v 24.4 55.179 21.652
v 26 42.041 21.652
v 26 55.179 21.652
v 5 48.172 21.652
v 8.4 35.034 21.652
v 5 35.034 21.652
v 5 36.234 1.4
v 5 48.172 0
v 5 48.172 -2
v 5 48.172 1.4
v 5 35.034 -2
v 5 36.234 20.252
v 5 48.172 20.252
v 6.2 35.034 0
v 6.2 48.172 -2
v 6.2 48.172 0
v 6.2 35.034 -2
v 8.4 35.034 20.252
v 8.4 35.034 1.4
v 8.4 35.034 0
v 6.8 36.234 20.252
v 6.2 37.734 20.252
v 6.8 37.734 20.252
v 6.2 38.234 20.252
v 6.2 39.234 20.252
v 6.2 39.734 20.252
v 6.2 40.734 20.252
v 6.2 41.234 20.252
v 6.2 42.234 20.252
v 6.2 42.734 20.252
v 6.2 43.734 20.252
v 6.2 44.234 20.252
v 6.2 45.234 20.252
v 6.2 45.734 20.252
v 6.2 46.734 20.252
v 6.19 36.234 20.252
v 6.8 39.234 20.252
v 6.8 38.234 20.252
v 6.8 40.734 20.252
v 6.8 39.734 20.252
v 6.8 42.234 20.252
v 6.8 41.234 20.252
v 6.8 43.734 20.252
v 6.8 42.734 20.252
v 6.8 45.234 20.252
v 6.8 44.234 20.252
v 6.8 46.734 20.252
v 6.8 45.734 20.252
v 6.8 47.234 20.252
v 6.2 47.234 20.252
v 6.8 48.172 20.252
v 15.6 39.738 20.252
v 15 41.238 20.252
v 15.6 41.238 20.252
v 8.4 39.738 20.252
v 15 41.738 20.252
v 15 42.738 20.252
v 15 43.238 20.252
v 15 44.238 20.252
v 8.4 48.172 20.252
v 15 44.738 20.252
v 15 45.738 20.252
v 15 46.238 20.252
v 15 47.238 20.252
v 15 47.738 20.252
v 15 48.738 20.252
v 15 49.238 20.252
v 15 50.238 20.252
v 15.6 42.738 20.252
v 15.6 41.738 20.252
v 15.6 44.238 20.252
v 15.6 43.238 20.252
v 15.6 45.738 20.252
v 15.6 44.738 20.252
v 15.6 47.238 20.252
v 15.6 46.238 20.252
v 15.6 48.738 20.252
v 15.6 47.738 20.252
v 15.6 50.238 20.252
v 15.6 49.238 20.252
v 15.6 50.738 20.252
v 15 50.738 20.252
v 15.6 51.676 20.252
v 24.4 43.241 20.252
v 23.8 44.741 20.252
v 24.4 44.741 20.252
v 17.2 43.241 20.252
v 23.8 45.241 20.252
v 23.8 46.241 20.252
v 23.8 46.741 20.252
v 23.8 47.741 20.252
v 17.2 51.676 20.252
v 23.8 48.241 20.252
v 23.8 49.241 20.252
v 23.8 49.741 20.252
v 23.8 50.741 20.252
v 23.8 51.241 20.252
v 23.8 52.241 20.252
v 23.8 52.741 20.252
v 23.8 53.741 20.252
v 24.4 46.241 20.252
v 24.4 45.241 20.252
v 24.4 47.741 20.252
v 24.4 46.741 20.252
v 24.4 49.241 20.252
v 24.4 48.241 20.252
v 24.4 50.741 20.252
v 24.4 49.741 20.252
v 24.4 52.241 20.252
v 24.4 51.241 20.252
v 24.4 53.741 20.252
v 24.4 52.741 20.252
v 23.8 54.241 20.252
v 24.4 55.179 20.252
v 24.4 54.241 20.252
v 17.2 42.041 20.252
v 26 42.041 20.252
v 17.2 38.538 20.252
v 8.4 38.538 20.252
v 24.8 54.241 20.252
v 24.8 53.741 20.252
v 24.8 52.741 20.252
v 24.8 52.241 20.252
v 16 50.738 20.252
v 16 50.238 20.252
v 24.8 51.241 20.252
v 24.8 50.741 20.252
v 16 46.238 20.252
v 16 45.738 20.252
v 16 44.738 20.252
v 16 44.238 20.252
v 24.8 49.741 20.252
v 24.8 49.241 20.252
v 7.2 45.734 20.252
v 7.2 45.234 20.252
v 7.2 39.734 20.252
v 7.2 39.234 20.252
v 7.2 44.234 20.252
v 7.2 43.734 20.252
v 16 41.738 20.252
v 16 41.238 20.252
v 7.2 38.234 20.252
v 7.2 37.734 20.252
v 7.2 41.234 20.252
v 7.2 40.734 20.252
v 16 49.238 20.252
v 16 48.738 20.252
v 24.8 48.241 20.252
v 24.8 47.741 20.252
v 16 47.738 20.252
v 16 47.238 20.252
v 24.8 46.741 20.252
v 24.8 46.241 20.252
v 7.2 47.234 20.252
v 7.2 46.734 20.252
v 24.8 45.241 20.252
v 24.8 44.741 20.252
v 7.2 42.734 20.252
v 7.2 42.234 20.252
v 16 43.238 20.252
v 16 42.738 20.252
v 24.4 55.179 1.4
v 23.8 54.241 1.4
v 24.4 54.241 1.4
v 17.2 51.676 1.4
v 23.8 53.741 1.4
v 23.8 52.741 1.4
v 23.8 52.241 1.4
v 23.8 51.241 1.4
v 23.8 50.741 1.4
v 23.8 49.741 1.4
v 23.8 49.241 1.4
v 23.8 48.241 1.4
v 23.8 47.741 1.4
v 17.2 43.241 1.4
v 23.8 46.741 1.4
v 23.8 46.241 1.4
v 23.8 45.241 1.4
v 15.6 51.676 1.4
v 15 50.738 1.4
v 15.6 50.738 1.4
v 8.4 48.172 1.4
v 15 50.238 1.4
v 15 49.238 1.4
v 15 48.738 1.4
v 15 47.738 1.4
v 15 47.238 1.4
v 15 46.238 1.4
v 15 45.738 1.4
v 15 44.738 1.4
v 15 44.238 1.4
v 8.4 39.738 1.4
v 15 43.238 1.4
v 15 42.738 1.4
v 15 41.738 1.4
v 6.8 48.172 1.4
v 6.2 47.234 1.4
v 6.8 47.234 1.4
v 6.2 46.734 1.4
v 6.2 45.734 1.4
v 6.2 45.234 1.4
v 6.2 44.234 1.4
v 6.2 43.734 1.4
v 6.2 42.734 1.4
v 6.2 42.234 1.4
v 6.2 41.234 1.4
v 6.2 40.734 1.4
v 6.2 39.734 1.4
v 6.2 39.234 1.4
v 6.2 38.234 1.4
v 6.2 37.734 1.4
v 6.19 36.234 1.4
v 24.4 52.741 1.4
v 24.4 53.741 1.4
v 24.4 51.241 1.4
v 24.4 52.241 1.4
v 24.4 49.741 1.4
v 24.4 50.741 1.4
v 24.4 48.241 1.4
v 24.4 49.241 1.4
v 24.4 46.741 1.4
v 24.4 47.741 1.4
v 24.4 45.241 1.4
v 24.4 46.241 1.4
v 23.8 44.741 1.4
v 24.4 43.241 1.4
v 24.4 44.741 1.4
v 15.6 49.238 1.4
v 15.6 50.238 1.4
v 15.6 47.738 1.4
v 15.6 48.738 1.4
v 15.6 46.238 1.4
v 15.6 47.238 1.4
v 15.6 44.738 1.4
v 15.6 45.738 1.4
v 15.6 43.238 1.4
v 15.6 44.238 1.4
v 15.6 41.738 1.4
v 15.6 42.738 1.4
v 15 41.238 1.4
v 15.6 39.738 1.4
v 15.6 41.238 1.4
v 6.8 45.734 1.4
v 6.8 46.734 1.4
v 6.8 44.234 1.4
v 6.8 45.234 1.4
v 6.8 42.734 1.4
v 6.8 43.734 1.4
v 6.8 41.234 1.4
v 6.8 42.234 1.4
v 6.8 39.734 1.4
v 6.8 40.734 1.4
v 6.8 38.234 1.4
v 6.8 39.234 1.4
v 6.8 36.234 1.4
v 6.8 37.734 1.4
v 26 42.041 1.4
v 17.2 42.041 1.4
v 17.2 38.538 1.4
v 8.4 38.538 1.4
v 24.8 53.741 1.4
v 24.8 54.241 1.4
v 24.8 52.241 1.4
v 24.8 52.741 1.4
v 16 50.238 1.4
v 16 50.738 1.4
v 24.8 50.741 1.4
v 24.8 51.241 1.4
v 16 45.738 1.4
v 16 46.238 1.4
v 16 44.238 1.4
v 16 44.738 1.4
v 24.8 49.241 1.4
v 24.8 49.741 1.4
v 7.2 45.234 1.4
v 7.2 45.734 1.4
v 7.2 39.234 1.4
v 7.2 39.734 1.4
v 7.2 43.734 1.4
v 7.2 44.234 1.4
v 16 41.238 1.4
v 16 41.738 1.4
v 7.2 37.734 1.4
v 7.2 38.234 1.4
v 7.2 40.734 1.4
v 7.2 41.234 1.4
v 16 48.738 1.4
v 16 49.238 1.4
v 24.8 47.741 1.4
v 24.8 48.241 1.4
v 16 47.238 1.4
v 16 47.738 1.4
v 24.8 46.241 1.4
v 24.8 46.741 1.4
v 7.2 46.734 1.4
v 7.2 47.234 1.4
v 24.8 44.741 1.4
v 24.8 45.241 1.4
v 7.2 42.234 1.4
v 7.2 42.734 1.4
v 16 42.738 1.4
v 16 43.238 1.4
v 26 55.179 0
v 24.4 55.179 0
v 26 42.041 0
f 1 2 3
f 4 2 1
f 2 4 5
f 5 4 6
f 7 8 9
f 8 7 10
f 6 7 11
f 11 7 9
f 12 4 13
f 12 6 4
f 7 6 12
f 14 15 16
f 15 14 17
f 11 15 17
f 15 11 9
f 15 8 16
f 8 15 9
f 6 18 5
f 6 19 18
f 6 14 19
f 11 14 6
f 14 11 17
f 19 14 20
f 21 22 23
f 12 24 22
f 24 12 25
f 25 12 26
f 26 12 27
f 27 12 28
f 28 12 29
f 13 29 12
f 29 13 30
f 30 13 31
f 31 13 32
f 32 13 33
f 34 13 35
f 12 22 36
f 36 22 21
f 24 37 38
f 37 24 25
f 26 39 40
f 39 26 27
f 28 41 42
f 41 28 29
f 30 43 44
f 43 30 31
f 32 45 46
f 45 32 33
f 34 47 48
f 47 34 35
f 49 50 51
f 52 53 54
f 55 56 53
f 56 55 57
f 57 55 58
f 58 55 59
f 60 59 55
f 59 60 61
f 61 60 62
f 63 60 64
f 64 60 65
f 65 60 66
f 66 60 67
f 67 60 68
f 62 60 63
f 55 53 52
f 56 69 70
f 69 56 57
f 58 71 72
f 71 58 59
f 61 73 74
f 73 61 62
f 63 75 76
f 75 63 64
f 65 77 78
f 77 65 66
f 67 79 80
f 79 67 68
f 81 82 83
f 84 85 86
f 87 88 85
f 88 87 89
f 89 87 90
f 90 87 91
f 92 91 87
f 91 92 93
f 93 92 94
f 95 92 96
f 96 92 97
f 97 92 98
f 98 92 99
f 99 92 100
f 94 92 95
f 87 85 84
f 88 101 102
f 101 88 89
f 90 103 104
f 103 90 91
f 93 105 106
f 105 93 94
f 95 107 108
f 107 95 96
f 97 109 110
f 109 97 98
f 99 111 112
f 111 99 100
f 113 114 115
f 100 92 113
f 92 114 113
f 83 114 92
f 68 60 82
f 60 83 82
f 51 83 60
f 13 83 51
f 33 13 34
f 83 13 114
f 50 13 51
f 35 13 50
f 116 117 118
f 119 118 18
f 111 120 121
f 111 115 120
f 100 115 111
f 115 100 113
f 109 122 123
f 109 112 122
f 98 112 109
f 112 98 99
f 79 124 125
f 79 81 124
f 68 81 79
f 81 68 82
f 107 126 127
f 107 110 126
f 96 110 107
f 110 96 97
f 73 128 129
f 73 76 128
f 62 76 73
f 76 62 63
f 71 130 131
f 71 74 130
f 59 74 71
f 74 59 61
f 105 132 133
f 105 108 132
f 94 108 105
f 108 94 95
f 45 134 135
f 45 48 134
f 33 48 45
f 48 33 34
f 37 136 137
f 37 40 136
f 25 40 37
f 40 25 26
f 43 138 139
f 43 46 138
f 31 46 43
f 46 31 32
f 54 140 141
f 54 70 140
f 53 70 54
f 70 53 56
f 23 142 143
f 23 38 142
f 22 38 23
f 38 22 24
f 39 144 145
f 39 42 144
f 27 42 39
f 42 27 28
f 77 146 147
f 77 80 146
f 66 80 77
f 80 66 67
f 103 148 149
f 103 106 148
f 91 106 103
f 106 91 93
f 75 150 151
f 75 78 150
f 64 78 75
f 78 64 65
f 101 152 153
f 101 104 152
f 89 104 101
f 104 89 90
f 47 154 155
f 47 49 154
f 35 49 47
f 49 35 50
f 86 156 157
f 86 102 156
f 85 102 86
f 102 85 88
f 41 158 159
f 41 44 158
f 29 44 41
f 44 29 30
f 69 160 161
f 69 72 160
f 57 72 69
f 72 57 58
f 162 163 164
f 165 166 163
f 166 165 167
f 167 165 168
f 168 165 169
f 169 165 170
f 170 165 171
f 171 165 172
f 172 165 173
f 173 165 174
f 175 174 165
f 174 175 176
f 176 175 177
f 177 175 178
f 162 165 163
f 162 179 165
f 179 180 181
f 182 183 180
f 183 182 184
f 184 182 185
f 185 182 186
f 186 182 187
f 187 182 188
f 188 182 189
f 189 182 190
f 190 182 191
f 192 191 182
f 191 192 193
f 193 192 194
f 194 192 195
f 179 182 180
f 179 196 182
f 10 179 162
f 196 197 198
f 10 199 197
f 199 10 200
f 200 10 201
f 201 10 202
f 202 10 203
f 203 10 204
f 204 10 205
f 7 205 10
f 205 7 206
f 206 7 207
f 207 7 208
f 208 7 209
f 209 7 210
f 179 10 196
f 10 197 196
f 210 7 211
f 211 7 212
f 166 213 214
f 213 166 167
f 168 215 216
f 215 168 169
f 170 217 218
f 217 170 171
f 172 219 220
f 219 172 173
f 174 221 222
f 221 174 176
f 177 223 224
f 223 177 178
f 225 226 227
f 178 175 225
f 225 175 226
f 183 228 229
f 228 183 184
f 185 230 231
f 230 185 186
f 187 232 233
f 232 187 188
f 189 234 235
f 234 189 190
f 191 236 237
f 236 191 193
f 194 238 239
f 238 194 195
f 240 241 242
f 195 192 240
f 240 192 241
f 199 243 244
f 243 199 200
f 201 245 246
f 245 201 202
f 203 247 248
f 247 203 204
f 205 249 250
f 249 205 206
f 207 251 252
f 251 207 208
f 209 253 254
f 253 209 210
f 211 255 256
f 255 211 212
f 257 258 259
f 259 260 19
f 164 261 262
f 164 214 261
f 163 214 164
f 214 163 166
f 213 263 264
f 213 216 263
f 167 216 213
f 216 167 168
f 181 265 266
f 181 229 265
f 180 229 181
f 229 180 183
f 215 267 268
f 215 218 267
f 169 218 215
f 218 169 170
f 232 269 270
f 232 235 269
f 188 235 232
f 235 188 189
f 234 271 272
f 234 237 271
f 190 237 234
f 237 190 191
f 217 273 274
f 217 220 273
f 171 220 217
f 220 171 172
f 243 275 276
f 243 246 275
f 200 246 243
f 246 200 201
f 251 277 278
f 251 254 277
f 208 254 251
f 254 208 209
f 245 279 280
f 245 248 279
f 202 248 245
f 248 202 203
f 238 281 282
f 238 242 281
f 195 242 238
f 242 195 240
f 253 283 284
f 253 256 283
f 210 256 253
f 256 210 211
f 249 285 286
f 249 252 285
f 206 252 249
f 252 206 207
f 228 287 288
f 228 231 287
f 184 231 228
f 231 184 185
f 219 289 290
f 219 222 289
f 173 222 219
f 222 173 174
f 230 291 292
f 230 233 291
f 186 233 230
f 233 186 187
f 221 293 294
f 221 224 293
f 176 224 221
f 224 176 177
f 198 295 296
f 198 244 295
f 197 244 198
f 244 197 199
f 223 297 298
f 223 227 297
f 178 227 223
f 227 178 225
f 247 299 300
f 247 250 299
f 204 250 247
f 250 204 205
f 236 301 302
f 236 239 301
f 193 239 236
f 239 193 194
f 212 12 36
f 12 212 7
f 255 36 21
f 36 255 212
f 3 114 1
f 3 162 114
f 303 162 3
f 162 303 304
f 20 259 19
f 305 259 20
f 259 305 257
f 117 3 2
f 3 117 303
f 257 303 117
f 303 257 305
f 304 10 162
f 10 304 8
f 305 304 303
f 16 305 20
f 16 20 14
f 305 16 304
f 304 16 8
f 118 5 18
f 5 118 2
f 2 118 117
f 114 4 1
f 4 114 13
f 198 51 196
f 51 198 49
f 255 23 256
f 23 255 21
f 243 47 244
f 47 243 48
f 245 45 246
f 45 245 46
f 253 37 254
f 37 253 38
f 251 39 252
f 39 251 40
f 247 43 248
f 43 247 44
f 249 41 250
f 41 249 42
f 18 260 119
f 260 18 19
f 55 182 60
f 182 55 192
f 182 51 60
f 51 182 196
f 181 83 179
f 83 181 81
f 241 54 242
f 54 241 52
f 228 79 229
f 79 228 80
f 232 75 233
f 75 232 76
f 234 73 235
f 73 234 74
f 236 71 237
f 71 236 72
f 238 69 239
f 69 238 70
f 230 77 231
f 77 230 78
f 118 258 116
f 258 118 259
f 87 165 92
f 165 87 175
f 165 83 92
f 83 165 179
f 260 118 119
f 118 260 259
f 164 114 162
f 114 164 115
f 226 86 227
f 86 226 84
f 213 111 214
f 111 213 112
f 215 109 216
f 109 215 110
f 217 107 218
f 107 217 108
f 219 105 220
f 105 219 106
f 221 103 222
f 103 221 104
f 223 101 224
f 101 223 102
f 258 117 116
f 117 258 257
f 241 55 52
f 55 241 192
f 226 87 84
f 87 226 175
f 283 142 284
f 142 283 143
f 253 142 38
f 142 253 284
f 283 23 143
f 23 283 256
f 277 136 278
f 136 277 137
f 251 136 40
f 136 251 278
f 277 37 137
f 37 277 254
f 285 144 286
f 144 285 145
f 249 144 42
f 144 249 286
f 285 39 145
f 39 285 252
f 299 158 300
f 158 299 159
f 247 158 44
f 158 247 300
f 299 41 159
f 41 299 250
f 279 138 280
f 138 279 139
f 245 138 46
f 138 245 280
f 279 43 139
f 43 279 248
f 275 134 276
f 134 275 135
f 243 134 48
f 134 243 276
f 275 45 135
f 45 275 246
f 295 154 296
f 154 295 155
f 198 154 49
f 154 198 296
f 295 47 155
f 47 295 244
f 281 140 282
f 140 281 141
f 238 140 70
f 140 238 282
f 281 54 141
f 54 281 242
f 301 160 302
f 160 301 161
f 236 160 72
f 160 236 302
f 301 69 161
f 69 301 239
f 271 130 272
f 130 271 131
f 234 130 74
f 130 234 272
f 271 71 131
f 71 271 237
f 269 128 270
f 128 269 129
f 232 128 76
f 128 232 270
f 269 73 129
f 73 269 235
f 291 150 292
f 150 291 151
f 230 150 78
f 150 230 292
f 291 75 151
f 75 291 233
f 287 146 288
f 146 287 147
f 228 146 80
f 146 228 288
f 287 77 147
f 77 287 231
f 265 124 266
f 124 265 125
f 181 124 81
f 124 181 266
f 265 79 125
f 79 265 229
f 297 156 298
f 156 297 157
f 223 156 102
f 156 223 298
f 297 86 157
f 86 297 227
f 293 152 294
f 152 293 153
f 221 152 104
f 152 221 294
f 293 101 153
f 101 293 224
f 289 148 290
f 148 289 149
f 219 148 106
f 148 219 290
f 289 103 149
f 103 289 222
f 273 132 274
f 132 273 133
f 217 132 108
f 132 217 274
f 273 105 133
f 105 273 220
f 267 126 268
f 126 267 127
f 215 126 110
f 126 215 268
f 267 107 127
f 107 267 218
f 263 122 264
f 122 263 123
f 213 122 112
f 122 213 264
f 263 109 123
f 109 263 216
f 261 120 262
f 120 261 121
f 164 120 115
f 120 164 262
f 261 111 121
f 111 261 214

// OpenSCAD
// =====================================================================
//  VIEW 08: STEP  -  print 4
//  Milwaukee Road 1939 rib side bay window caboose - G scale (1:29)
//  Corner step set (3 treads)
//  Print orientation: lying on one stringer
//
//  Open this file in OpenSCAD to look at just this part.
//  To export this part's STL: Render (F6), then File > Export > STL.
//  The part's code lives in library/step.scad; settings in
//  library/caboose_params.scad.
// =====================================================================

part     = "step";    // which part - leave as is
view     = "print";  // "print"     = laid out as it goes on the printer bed
                     //               (same as the exported STL)
                     // "installed" = in its place on the car (all copies)
show_car = false;    // with "installed": faint see-through body, roof and
                     //   underframe around it for context

include <../library/caboose_all.scad>

if (view == "installed") {
    caboose_installed(part);
    if (show_car) car_ghost();
} else {
    caboose_print(part);
}
echo(str("step: print 4"));
